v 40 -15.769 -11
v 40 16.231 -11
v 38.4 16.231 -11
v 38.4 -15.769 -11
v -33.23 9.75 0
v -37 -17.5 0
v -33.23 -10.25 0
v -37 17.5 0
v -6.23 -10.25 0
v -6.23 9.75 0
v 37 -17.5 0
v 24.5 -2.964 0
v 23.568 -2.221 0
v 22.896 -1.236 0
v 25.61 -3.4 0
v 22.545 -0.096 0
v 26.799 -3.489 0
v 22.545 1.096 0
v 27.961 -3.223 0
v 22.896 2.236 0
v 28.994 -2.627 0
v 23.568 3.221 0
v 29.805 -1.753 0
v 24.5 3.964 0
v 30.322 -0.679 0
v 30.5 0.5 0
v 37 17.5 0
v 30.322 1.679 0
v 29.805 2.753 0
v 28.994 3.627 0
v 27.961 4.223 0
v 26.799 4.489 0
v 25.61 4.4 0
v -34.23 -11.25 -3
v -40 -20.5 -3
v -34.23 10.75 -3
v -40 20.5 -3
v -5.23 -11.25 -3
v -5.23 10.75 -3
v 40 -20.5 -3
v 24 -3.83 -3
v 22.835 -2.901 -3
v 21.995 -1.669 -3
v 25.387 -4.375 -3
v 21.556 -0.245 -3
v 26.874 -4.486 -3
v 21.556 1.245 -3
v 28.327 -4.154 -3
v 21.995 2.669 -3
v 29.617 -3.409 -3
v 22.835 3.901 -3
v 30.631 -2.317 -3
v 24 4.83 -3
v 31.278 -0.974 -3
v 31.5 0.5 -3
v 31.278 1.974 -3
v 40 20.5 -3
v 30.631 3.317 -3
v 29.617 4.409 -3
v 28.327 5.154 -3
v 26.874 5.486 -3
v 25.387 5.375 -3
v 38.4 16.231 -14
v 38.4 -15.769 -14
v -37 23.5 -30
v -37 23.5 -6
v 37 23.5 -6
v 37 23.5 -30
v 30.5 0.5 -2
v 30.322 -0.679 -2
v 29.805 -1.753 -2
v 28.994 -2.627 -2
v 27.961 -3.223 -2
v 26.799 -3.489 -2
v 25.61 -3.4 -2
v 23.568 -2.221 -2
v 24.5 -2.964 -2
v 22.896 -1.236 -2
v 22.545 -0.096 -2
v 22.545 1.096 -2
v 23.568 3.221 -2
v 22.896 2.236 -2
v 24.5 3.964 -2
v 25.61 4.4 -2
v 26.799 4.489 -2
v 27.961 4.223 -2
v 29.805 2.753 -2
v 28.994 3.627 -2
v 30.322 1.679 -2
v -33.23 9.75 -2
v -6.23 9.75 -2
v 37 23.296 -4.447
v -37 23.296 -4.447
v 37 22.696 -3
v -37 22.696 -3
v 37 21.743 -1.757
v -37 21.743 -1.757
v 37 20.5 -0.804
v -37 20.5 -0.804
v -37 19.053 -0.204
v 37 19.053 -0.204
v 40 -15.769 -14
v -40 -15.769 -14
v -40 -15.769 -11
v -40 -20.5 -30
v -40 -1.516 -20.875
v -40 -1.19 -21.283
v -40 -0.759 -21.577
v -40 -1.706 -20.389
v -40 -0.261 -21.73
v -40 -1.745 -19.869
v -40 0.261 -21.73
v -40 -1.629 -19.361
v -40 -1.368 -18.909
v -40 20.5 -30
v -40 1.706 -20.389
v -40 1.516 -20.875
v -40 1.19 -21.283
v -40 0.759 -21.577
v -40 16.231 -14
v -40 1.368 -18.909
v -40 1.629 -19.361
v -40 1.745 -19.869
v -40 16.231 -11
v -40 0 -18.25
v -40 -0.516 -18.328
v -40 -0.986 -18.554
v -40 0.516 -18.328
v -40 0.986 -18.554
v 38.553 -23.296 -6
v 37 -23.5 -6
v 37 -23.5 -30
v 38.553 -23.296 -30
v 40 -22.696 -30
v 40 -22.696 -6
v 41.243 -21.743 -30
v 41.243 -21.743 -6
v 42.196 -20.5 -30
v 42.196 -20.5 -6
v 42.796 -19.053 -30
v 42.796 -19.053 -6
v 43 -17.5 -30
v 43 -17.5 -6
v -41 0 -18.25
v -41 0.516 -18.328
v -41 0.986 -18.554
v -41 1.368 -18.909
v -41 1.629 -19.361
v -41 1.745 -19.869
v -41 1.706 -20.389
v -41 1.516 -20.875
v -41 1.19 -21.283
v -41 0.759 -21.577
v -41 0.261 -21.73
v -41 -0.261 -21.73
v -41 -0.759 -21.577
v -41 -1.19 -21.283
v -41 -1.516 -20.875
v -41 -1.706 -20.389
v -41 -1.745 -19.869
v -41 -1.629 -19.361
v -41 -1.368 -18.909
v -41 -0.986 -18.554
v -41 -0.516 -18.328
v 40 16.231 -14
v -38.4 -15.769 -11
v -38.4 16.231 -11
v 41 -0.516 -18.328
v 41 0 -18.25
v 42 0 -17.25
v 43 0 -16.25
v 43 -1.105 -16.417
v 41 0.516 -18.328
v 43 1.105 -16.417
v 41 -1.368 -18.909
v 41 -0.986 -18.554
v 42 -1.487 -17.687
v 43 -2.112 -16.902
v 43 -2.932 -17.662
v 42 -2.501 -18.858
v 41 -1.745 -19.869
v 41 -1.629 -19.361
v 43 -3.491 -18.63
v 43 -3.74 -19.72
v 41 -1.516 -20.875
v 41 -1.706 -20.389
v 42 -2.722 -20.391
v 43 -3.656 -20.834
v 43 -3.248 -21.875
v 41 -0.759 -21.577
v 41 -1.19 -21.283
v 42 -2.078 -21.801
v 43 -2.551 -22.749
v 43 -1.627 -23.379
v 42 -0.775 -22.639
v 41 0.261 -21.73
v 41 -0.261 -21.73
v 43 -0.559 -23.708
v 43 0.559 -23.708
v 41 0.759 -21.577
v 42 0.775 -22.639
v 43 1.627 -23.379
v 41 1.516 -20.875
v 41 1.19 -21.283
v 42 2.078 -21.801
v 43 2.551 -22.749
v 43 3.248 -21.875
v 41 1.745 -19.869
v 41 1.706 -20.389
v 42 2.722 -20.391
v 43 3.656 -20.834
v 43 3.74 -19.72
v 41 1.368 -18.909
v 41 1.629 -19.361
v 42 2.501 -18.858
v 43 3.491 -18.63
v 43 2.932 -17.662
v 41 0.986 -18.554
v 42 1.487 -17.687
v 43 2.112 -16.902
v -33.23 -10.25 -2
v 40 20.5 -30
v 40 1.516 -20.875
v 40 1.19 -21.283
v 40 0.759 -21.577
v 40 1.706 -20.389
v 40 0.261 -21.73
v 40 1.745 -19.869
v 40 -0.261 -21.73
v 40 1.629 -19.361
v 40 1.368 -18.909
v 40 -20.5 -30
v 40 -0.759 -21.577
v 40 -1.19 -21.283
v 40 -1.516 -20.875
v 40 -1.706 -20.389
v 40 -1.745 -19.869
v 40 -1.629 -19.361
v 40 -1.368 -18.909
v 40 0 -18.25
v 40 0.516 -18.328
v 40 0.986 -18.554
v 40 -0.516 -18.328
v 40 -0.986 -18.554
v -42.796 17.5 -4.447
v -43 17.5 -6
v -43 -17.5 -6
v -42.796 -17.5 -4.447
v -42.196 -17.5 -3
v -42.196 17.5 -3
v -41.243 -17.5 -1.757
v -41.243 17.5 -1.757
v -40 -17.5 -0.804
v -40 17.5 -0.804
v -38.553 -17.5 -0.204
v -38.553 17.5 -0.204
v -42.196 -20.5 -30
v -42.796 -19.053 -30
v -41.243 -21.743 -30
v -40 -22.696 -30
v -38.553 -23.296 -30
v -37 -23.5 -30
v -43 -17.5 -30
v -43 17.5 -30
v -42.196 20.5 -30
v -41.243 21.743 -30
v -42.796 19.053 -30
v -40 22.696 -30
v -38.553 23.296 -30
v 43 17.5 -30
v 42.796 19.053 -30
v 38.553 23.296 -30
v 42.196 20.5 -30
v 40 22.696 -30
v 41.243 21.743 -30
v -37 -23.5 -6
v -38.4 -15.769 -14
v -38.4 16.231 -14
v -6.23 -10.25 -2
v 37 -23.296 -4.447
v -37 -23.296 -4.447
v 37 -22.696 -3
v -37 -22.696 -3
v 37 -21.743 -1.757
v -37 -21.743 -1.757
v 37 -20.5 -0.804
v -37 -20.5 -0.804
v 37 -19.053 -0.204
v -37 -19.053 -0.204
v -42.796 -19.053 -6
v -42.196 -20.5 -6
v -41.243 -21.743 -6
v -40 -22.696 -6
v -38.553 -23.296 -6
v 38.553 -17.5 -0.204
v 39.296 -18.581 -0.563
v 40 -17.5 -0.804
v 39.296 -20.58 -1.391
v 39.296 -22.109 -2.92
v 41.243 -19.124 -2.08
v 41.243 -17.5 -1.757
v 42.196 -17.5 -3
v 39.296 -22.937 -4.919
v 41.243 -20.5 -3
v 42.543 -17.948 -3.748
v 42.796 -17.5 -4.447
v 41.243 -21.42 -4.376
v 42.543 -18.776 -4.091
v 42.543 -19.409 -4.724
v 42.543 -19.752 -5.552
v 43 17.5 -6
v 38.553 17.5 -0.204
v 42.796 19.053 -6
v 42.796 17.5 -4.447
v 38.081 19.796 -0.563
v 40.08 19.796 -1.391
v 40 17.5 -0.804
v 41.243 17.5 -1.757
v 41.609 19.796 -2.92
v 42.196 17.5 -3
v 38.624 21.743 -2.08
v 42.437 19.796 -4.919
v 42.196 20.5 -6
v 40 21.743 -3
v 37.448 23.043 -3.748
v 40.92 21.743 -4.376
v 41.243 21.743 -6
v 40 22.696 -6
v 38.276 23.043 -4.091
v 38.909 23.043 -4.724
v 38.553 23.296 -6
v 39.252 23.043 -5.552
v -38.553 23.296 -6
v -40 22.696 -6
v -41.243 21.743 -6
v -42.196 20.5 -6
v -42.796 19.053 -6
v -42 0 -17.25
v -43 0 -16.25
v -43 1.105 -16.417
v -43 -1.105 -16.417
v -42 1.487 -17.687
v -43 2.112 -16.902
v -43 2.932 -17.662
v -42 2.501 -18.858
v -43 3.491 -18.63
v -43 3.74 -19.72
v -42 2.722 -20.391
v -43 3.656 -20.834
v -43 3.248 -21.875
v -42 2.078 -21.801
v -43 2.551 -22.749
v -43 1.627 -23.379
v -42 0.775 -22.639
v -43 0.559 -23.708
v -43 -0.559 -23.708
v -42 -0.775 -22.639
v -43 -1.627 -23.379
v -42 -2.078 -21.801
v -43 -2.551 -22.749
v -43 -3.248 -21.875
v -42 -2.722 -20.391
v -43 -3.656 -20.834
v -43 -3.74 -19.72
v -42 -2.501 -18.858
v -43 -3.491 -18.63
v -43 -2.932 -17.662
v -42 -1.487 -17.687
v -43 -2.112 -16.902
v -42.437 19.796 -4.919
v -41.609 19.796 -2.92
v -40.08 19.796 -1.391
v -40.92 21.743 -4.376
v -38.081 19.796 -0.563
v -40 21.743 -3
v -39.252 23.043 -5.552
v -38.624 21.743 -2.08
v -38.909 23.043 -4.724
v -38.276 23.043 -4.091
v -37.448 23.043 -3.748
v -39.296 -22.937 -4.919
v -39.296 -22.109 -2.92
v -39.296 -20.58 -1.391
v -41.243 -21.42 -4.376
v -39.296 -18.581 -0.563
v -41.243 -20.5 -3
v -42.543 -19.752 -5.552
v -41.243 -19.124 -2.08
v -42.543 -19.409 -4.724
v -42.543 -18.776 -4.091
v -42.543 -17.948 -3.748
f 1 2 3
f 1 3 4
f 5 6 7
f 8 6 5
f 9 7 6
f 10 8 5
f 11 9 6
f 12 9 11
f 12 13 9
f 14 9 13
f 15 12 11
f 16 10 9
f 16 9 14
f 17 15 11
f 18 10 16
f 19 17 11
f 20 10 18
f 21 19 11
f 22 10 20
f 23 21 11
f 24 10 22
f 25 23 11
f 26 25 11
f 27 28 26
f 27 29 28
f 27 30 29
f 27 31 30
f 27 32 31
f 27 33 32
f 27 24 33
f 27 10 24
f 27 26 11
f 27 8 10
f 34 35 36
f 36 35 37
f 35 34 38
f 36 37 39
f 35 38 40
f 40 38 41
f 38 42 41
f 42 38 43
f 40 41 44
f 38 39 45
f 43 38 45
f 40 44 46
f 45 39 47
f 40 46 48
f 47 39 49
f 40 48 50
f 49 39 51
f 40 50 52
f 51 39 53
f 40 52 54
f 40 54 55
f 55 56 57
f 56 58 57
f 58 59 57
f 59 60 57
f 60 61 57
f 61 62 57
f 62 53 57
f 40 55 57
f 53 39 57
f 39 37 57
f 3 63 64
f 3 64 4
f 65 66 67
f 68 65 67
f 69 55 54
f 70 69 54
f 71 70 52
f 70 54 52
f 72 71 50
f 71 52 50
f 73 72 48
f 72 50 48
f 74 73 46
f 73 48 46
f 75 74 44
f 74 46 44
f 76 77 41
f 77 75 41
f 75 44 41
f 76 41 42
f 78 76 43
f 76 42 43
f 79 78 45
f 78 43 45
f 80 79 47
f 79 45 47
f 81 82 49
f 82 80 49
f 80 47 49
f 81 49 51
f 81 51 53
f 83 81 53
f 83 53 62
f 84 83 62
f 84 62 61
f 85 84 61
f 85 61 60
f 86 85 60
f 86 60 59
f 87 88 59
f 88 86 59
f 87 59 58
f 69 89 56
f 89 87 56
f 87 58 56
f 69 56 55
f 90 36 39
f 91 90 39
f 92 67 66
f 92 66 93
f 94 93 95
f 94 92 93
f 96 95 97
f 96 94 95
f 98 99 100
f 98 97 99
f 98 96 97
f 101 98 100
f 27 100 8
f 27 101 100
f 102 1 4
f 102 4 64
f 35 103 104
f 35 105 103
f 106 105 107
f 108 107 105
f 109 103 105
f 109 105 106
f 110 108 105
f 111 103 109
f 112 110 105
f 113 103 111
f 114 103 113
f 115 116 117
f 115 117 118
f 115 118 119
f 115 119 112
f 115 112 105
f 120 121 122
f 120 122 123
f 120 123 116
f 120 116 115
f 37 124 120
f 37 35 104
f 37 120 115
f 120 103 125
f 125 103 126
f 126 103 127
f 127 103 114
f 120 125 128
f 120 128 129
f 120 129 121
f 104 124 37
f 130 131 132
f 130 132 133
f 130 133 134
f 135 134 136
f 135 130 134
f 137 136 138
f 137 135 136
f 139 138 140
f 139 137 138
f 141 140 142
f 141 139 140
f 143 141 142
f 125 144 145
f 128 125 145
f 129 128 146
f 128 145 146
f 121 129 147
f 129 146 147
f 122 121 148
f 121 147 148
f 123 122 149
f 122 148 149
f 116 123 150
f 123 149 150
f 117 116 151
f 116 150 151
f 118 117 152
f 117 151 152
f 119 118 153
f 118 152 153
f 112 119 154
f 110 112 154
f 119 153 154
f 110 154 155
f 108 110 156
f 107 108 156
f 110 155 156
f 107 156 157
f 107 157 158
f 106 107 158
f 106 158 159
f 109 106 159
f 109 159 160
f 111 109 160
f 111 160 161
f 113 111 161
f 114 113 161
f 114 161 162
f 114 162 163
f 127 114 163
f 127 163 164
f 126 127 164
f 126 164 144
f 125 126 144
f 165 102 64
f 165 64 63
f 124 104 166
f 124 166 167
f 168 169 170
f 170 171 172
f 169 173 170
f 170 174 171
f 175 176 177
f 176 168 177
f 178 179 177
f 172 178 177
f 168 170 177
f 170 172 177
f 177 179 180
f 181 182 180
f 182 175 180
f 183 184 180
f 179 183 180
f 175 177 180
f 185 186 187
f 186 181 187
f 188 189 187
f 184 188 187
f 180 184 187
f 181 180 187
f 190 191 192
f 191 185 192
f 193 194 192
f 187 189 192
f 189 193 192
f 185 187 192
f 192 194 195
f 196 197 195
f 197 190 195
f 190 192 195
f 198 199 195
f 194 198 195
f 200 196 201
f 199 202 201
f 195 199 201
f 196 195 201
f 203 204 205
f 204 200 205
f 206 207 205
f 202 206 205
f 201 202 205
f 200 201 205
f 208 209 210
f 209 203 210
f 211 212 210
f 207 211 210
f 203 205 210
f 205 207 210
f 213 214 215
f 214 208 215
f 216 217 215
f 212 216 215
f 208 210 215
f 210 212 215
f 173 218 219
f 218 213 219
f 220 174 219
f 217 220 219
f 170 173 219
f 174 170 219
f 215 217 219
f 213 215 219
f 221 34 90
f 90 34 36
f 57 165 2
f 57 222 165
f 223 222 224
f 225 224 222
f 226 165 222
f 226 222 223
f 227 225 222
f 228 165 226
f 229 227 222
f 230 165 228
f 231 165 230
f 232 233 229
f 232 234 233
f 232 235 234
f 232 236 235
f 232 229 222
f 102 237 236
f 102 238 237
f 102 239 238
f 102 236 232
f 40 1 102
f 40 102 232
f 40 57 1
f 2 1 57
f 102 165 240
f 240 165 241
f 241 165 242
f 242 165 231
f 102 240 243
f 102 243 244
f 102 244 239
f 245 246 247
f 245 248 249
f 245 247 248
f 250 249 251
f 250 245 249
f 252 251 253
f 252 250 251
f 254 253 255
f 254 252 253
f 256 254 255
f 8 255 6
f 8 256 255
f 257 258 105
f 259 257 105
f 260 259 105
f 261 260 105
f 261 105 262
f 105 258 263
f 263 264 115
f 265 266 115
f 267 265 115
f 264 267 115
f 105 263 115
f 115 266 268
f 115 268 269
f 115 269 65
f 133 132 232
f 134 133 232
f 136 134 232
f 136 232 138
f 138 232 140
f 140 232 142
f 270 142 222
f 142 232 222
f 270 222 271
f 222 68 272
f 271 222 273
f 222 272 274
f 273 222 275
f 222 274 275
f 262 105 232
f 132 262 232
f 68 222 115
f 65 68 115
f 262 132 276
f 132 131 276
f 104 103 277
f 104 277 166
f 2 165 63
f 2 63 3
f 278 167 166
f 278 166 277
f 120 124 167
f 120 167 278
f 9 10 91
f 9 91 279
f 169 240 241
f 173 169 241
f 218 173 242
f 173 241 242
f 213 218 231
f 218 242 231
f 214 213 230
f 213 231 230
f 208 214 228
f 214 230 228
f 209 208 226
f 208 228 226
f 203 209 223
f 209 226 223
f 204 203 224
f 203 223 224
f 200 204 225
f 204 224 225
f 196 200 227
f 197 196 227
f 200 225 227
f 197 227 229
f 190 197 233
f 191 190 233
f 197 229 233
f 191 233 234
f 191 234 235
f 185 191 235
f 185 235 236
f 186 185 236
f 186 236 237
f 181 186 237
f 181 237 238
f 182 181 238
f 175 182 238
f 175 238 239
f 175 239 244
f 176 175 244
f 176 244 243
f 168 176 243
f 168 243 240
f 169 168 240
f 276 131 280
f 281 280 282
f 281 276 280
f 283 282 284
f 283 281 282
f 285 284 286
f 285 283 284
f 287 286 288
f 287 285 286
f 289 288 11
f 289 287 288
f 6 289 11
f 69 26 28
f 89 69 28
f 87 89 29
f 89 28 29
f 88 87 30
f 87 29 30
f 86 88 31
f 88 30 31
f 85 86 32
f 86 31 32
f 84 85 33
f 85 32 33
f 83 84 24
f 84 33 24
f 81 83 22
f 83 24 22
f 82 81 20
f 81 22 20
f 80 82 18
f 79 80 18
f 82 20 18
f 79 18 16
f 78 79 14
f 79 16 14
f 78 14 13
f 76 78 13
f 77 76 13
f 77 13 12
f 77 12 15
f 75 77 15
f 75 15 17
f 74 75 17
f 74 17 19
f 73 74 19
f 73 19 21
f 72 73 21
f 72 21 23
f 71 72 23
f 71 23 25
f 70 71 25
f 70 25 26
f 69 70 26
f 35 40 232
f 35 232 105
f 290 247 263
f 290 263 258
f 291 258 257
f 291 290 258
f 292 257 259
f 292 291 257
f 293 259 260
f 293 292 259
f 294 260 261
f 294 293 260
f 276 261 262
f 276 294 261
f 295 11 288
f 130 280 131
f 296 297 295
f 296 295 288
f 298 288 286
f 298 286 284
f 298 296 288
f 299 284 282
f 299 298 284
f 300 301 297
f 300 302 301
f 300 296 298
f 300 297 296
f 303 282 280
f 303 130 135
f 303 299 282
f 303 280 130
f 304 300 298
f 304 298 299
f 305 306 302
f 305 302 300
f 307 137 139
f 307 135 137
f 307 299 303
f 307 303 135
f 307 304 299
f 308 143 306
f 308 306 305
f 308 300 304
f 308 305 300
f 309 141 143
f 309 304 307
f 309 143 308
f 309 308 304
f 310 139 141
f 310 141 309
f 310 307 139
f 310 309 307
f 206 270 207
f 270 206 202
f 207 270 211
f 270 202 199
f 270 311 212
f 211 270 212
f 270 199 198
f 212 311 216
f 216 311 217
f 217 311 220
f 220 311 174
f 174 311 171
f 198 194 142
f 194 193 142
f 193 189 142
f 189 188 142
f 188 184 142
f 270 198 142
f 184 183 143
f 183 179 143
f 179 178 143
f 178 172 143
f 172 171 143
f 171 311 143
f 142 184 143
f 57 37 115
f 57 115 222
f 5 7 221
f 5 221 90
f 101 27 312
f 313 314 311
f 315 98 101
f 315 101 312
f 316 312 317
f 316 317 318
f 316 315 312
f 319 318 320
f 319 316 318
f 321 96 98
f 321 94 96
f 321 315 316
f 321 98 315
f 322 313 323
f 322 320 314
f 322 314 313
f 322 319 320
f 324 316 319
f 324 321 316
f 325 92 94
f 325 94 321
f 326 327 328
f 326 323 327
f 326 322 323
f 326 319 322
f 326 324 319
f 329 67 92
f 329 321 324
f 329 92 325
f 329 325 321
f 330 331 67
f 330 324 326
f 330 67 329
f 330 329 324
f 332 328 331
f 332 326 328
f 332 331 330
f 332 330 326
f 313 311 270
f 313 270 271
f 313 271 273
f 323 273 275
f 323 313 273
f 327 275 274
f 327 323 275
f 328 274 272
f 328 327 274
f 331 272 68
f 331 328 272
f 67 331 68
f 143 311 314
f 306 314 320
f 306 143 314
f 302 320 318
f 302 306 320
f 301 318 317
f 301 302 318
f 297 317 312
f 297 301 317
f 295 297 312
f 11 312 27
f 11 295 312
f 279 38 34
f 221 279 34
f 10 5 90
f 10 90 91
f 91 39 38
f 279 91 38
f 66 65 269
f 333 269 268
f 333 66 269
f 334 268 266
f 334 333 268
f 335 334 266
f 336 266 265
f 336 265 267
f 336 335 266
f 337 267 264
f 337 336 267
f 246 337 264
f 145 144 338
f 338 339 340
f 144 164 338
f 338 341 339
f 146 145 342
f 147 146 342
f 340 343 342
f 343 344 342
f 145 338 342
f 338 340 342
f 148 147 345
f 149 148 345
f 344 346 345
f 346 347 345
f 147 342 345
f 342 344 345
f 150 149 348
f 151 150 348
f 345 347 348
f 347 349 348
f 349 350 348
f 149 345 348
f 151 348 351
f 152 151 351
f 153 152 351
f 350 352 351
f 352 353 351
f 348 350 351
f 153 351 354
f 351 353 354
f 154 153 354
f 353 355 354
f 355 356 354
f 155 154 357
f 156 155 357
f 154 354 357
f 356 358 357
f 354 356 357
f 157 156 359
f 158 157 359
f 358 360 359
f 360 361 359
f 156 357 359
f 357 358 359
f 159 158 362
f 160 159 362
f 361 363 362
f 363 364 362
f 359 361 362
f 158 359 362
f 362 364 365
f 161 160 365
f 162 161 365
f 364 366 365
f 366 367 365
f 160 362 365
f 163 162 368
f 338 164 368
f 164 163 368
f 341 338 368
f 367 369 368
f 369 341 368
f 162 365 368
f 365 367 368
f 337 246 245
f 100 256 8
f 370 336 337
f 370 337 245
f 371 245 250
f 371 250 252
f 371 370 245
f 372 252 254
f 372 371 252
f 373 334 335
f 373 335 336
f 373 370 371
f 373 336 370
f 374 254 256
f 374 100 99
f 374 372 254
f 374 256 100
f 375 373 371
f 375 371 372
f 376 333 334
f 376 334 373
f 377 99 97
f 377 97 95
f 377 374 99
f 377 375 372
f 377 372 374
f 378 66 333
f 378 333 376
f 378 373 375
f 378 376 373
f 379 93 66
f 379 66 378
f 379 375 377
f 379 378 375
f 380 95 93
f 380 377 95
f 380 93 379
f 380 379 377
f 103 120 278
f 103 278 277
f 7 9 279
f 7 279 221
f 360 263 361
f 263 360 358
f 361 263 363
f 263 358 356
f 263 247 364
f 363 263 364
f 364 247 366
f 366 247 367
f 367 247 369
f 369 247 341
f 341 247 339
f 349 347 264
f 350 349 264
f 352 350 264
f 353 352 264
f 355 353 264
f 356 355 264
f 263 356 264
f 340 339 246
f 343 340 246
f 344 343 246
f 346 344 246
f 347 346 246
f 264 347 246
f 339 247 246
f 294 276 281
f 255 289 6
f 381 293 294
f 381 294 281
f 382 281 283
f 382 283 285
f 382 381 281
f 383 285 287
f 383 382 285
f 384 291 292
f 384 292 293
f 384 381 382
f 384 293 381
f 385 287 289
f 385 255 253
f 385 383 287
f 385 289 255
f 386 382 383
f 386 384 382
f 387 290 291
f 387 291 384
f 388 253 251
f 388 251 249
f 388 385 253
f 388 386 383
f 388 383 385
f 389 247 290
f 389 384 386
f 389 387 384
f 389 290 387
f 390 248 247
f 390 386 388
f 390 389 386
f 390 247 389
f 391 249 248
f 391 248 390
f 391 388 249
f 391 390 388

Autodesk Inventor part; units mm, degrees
ref_plane "YZ Plane" through (0, 0, 0) normal (1, 0, 0) x (0, 1, 0)
ref_plane "XZ Plane" through (0, 0, 0) normal (0, 1, 0) x (-1, 0, 0)
ref_plane "XY Plane" through (0, 0, 0) normal (0, 0, 1) x (1, 0, 0)
sketch "Sketch1" plane through (0, 0, 0) normal (0, 0, 1) x (1, 0, 0)
  line L0 (-40, 20.5) -> (40, 20.5)
  line L1 (40, 20.5) -> (40, -20.5)
  line L2 (40, -20.5) -> (-40, -20.5)
  line L3 (-40, -20.5) -> (-40, 20.5)
  line L4 (-40, 20.5) -> (40, -20.5) construction
  line L5 (40, 20.5) -> (-40, -20.5) construction
  line L6 (-43, 23.5) -> (43, 23.5)
  line L7 (43, 23.5) -> (43, -23.5)
  line L8 (43, -23.5) -> (-43, -23.5)
  line L9 (-43, -23.5) -> (-43, 23.5)
  line L10 (-43, 23.5) -> (43, -23.5) construction
  line L11 (43, 23.5) -> (-43, -23.5) construction
  point P0 (0, 0)
  dimension "d0" = 80
  dimension "d1" = 41
  dimension "d2" = 86
  dimension "d3" = 47
extrude "Extrusion1" add sketch "Sketch1" against normal blind 30
sketch "Sketch2" plane through (0, 0, 0) normal (0, 0, 1) x (1, 0, 0)
  line L0 (-40, -20.5) -> (-40, 20.5) projected
  line L1 (-40, 20.5) -> (40, 20.5) projected
  line L2 (40, 20.5) -> (40, -20.5) projected
  line L3 (40, -20.5) -> (-40, -20.5) projected
  point P0 (0, 0)
extrude "Extrusion2" add sketch "Sketch2" against normal blind 3
sketch "Sketch4" plane through (0, 0, 0) normal (0, 0, 1) x (1, 0, 0)
  line L0 (-43, 23.5) -> (43, 23.5) projected
  line L1 (-43, -23.5) -> (-43, 23.5) projected
  line L2 (43, -23.5) -> (-43, -23.5) projected
  line L3 (43, 23.5) -> (43, -23.5) projected
  line L4 (-39.5, 20) -> (39.5, 20)
  line L5 (39.5, 20) -> (39.5, -20)
  line L6 (39.5, -20) -> (-39.5, -20)
  line L7 (-39.5, -20) -> (-39.5, 20)
  line L8 (-39.5, 20) -> (39.5, -20) construction
  line L9 (39.5, 20) -> (-39.5, -20) construction
  point P0 (0, 0)
  dimension "d12" = 79
  dimension "d13" = 40
sketch "Sketch5" plane through (0, 0, 0) normal (0, 0, 1) x (1, 0, 0)
  line L0 (-33.23, 9.75) -> (-6.23, 9.75)
  line L1 (-6.23, 9.75) -> (-6.23, -10.25)
  line L2 (-6.23, -10.25) -> (-33.23, -10.25)
  line L3 (-33.23, -10.25) -> (-33.23, 9.75)
  line L4 (-33.23, 9.75) -> (-6.23, -10.25) construction
  line L5 (-6.23, 9.75) -> (-33.23, -10.25) construction
  line L6 (-39.5, 20) -> (39.5, 20) projected
  line L7 (-39.5, -20) -> (-39.5, 20) projected
  line L8 (39.5, -20) -> (-39.5, -20) projected
  point P0 (0, 0)
  point P1 (-19.73, -0.25)
  dimension "d14" = 27
  dimension "d15" = 20
  dimension "d16" = 10.25
  dimension "d17" = 6.27
extrude "Extrusion3" cut sketch "Sketch5" against normal blind 3
sketch "Sketch6" plane through (0, 0, 0) normal (0, 0, 1) x (1, 0, 0)
  circle A0 centre (26.5, 0.5) radius 4
  line L0 (39.5, -20) -> (-39.5, -20) projected
  line L1 (39.5, 20) -> (39.5, -20) projected
  line L2 (-39.5, 20) -> (39.5, 20) projected
  point P0 (0, 0)
  dimension "d20" = 8
  dimension "d21" = 20.5
  dimension "d22" = 13
extrude "Extrusion4" cut sketch "Sketch6" against normal blind 3
chamfer "Chamfer1" distance 1 angle 45 4 edges at (-6.23, -0.25, -3) (-19.73, 9.75, -3) (-19.73, -10.25, -3) (-33.23, -0.25, -3)
chamfer "Chamfer2" distance 1 angle 45 1 edges at (22.5, 0.5, -3)
fillet "Fillet1" radius 6 4 edges at (0, 23.5, 0) (43, 0, 0) (0, -23.5, 0) (-43, 0, 0)
fillet "Fillet2" radius 6 8 edges at (-41.2426, 21.7426, -1.7574) (-43, 23.5, -18) (41.2426, 21.7426, -1.7574) (43, 23.5, -18) (41.2426, -21.7426, -1.7574) (43, -23.5, -18) (-43, -23.5, -18) (-41.2426, -21.7426, -1.7574)
sketch "Sketch7" plane through (-43, -17.5, -6) normal (-1, 0, 0) x (0, 0, 1)
  line L0 (-24, 0) -> (-24, 35) projected
  circle A0 centre (-14, 17.5) radius 1.75
  point P0 (6, 17.5)
  dimension "d33" = 3.5
  dimension "d34" = 10
extrude "Extrusion5" cut sketch "Sketch7" against normal through all
chamfer "Chamfer3" distance 2 angle 45 2 edges at (-43, 0, -21.75) (43, 0, -21.75)
sketch "Sketch8" plane through (-40, -20.5, -30) normal (1, 0, 0) x (0, 0, -1)
  line L0 (-27, 41) -> (-27, 0) projected
  line L1 (-19, 36.7314) -> (-16, 36.7314)
  line L2 (-16, 36.7314) -> (-16, 4.7314)
  line L3 (-16, 4.7314) -> (-19, 4.7314)
  line L4 (-19, 4.7314) -> (-19, 36.7314)
  point P0 (-30, 20.5)
  dimension "d40" = 3
  dimension "d41" = 32
  dimension "d42" = 8
extrude "Extrusion6" add sketch "Sketch8" along normal blind 1.6
sketch "Sketch9" plane through (40, -20.5, -30) normal (-1, 0, 0) x (0, 0, 1)
  line L0 (16, 36.7314) -> (19, 36.7314) projected
  line L1 (19, 36.7314) -> (19, 4.7314) projected
  line L2 (19, 4.7314) -> (16, 4.7314) projected
  line L3 (16, 4.7314) -> (16, 36.7314) projected
  point P0 (30, 20.5)
extrude "Extrusion7" add sketch "Sketch9" along normal blind 1.6
properties part number "obudowa - timer- front"
